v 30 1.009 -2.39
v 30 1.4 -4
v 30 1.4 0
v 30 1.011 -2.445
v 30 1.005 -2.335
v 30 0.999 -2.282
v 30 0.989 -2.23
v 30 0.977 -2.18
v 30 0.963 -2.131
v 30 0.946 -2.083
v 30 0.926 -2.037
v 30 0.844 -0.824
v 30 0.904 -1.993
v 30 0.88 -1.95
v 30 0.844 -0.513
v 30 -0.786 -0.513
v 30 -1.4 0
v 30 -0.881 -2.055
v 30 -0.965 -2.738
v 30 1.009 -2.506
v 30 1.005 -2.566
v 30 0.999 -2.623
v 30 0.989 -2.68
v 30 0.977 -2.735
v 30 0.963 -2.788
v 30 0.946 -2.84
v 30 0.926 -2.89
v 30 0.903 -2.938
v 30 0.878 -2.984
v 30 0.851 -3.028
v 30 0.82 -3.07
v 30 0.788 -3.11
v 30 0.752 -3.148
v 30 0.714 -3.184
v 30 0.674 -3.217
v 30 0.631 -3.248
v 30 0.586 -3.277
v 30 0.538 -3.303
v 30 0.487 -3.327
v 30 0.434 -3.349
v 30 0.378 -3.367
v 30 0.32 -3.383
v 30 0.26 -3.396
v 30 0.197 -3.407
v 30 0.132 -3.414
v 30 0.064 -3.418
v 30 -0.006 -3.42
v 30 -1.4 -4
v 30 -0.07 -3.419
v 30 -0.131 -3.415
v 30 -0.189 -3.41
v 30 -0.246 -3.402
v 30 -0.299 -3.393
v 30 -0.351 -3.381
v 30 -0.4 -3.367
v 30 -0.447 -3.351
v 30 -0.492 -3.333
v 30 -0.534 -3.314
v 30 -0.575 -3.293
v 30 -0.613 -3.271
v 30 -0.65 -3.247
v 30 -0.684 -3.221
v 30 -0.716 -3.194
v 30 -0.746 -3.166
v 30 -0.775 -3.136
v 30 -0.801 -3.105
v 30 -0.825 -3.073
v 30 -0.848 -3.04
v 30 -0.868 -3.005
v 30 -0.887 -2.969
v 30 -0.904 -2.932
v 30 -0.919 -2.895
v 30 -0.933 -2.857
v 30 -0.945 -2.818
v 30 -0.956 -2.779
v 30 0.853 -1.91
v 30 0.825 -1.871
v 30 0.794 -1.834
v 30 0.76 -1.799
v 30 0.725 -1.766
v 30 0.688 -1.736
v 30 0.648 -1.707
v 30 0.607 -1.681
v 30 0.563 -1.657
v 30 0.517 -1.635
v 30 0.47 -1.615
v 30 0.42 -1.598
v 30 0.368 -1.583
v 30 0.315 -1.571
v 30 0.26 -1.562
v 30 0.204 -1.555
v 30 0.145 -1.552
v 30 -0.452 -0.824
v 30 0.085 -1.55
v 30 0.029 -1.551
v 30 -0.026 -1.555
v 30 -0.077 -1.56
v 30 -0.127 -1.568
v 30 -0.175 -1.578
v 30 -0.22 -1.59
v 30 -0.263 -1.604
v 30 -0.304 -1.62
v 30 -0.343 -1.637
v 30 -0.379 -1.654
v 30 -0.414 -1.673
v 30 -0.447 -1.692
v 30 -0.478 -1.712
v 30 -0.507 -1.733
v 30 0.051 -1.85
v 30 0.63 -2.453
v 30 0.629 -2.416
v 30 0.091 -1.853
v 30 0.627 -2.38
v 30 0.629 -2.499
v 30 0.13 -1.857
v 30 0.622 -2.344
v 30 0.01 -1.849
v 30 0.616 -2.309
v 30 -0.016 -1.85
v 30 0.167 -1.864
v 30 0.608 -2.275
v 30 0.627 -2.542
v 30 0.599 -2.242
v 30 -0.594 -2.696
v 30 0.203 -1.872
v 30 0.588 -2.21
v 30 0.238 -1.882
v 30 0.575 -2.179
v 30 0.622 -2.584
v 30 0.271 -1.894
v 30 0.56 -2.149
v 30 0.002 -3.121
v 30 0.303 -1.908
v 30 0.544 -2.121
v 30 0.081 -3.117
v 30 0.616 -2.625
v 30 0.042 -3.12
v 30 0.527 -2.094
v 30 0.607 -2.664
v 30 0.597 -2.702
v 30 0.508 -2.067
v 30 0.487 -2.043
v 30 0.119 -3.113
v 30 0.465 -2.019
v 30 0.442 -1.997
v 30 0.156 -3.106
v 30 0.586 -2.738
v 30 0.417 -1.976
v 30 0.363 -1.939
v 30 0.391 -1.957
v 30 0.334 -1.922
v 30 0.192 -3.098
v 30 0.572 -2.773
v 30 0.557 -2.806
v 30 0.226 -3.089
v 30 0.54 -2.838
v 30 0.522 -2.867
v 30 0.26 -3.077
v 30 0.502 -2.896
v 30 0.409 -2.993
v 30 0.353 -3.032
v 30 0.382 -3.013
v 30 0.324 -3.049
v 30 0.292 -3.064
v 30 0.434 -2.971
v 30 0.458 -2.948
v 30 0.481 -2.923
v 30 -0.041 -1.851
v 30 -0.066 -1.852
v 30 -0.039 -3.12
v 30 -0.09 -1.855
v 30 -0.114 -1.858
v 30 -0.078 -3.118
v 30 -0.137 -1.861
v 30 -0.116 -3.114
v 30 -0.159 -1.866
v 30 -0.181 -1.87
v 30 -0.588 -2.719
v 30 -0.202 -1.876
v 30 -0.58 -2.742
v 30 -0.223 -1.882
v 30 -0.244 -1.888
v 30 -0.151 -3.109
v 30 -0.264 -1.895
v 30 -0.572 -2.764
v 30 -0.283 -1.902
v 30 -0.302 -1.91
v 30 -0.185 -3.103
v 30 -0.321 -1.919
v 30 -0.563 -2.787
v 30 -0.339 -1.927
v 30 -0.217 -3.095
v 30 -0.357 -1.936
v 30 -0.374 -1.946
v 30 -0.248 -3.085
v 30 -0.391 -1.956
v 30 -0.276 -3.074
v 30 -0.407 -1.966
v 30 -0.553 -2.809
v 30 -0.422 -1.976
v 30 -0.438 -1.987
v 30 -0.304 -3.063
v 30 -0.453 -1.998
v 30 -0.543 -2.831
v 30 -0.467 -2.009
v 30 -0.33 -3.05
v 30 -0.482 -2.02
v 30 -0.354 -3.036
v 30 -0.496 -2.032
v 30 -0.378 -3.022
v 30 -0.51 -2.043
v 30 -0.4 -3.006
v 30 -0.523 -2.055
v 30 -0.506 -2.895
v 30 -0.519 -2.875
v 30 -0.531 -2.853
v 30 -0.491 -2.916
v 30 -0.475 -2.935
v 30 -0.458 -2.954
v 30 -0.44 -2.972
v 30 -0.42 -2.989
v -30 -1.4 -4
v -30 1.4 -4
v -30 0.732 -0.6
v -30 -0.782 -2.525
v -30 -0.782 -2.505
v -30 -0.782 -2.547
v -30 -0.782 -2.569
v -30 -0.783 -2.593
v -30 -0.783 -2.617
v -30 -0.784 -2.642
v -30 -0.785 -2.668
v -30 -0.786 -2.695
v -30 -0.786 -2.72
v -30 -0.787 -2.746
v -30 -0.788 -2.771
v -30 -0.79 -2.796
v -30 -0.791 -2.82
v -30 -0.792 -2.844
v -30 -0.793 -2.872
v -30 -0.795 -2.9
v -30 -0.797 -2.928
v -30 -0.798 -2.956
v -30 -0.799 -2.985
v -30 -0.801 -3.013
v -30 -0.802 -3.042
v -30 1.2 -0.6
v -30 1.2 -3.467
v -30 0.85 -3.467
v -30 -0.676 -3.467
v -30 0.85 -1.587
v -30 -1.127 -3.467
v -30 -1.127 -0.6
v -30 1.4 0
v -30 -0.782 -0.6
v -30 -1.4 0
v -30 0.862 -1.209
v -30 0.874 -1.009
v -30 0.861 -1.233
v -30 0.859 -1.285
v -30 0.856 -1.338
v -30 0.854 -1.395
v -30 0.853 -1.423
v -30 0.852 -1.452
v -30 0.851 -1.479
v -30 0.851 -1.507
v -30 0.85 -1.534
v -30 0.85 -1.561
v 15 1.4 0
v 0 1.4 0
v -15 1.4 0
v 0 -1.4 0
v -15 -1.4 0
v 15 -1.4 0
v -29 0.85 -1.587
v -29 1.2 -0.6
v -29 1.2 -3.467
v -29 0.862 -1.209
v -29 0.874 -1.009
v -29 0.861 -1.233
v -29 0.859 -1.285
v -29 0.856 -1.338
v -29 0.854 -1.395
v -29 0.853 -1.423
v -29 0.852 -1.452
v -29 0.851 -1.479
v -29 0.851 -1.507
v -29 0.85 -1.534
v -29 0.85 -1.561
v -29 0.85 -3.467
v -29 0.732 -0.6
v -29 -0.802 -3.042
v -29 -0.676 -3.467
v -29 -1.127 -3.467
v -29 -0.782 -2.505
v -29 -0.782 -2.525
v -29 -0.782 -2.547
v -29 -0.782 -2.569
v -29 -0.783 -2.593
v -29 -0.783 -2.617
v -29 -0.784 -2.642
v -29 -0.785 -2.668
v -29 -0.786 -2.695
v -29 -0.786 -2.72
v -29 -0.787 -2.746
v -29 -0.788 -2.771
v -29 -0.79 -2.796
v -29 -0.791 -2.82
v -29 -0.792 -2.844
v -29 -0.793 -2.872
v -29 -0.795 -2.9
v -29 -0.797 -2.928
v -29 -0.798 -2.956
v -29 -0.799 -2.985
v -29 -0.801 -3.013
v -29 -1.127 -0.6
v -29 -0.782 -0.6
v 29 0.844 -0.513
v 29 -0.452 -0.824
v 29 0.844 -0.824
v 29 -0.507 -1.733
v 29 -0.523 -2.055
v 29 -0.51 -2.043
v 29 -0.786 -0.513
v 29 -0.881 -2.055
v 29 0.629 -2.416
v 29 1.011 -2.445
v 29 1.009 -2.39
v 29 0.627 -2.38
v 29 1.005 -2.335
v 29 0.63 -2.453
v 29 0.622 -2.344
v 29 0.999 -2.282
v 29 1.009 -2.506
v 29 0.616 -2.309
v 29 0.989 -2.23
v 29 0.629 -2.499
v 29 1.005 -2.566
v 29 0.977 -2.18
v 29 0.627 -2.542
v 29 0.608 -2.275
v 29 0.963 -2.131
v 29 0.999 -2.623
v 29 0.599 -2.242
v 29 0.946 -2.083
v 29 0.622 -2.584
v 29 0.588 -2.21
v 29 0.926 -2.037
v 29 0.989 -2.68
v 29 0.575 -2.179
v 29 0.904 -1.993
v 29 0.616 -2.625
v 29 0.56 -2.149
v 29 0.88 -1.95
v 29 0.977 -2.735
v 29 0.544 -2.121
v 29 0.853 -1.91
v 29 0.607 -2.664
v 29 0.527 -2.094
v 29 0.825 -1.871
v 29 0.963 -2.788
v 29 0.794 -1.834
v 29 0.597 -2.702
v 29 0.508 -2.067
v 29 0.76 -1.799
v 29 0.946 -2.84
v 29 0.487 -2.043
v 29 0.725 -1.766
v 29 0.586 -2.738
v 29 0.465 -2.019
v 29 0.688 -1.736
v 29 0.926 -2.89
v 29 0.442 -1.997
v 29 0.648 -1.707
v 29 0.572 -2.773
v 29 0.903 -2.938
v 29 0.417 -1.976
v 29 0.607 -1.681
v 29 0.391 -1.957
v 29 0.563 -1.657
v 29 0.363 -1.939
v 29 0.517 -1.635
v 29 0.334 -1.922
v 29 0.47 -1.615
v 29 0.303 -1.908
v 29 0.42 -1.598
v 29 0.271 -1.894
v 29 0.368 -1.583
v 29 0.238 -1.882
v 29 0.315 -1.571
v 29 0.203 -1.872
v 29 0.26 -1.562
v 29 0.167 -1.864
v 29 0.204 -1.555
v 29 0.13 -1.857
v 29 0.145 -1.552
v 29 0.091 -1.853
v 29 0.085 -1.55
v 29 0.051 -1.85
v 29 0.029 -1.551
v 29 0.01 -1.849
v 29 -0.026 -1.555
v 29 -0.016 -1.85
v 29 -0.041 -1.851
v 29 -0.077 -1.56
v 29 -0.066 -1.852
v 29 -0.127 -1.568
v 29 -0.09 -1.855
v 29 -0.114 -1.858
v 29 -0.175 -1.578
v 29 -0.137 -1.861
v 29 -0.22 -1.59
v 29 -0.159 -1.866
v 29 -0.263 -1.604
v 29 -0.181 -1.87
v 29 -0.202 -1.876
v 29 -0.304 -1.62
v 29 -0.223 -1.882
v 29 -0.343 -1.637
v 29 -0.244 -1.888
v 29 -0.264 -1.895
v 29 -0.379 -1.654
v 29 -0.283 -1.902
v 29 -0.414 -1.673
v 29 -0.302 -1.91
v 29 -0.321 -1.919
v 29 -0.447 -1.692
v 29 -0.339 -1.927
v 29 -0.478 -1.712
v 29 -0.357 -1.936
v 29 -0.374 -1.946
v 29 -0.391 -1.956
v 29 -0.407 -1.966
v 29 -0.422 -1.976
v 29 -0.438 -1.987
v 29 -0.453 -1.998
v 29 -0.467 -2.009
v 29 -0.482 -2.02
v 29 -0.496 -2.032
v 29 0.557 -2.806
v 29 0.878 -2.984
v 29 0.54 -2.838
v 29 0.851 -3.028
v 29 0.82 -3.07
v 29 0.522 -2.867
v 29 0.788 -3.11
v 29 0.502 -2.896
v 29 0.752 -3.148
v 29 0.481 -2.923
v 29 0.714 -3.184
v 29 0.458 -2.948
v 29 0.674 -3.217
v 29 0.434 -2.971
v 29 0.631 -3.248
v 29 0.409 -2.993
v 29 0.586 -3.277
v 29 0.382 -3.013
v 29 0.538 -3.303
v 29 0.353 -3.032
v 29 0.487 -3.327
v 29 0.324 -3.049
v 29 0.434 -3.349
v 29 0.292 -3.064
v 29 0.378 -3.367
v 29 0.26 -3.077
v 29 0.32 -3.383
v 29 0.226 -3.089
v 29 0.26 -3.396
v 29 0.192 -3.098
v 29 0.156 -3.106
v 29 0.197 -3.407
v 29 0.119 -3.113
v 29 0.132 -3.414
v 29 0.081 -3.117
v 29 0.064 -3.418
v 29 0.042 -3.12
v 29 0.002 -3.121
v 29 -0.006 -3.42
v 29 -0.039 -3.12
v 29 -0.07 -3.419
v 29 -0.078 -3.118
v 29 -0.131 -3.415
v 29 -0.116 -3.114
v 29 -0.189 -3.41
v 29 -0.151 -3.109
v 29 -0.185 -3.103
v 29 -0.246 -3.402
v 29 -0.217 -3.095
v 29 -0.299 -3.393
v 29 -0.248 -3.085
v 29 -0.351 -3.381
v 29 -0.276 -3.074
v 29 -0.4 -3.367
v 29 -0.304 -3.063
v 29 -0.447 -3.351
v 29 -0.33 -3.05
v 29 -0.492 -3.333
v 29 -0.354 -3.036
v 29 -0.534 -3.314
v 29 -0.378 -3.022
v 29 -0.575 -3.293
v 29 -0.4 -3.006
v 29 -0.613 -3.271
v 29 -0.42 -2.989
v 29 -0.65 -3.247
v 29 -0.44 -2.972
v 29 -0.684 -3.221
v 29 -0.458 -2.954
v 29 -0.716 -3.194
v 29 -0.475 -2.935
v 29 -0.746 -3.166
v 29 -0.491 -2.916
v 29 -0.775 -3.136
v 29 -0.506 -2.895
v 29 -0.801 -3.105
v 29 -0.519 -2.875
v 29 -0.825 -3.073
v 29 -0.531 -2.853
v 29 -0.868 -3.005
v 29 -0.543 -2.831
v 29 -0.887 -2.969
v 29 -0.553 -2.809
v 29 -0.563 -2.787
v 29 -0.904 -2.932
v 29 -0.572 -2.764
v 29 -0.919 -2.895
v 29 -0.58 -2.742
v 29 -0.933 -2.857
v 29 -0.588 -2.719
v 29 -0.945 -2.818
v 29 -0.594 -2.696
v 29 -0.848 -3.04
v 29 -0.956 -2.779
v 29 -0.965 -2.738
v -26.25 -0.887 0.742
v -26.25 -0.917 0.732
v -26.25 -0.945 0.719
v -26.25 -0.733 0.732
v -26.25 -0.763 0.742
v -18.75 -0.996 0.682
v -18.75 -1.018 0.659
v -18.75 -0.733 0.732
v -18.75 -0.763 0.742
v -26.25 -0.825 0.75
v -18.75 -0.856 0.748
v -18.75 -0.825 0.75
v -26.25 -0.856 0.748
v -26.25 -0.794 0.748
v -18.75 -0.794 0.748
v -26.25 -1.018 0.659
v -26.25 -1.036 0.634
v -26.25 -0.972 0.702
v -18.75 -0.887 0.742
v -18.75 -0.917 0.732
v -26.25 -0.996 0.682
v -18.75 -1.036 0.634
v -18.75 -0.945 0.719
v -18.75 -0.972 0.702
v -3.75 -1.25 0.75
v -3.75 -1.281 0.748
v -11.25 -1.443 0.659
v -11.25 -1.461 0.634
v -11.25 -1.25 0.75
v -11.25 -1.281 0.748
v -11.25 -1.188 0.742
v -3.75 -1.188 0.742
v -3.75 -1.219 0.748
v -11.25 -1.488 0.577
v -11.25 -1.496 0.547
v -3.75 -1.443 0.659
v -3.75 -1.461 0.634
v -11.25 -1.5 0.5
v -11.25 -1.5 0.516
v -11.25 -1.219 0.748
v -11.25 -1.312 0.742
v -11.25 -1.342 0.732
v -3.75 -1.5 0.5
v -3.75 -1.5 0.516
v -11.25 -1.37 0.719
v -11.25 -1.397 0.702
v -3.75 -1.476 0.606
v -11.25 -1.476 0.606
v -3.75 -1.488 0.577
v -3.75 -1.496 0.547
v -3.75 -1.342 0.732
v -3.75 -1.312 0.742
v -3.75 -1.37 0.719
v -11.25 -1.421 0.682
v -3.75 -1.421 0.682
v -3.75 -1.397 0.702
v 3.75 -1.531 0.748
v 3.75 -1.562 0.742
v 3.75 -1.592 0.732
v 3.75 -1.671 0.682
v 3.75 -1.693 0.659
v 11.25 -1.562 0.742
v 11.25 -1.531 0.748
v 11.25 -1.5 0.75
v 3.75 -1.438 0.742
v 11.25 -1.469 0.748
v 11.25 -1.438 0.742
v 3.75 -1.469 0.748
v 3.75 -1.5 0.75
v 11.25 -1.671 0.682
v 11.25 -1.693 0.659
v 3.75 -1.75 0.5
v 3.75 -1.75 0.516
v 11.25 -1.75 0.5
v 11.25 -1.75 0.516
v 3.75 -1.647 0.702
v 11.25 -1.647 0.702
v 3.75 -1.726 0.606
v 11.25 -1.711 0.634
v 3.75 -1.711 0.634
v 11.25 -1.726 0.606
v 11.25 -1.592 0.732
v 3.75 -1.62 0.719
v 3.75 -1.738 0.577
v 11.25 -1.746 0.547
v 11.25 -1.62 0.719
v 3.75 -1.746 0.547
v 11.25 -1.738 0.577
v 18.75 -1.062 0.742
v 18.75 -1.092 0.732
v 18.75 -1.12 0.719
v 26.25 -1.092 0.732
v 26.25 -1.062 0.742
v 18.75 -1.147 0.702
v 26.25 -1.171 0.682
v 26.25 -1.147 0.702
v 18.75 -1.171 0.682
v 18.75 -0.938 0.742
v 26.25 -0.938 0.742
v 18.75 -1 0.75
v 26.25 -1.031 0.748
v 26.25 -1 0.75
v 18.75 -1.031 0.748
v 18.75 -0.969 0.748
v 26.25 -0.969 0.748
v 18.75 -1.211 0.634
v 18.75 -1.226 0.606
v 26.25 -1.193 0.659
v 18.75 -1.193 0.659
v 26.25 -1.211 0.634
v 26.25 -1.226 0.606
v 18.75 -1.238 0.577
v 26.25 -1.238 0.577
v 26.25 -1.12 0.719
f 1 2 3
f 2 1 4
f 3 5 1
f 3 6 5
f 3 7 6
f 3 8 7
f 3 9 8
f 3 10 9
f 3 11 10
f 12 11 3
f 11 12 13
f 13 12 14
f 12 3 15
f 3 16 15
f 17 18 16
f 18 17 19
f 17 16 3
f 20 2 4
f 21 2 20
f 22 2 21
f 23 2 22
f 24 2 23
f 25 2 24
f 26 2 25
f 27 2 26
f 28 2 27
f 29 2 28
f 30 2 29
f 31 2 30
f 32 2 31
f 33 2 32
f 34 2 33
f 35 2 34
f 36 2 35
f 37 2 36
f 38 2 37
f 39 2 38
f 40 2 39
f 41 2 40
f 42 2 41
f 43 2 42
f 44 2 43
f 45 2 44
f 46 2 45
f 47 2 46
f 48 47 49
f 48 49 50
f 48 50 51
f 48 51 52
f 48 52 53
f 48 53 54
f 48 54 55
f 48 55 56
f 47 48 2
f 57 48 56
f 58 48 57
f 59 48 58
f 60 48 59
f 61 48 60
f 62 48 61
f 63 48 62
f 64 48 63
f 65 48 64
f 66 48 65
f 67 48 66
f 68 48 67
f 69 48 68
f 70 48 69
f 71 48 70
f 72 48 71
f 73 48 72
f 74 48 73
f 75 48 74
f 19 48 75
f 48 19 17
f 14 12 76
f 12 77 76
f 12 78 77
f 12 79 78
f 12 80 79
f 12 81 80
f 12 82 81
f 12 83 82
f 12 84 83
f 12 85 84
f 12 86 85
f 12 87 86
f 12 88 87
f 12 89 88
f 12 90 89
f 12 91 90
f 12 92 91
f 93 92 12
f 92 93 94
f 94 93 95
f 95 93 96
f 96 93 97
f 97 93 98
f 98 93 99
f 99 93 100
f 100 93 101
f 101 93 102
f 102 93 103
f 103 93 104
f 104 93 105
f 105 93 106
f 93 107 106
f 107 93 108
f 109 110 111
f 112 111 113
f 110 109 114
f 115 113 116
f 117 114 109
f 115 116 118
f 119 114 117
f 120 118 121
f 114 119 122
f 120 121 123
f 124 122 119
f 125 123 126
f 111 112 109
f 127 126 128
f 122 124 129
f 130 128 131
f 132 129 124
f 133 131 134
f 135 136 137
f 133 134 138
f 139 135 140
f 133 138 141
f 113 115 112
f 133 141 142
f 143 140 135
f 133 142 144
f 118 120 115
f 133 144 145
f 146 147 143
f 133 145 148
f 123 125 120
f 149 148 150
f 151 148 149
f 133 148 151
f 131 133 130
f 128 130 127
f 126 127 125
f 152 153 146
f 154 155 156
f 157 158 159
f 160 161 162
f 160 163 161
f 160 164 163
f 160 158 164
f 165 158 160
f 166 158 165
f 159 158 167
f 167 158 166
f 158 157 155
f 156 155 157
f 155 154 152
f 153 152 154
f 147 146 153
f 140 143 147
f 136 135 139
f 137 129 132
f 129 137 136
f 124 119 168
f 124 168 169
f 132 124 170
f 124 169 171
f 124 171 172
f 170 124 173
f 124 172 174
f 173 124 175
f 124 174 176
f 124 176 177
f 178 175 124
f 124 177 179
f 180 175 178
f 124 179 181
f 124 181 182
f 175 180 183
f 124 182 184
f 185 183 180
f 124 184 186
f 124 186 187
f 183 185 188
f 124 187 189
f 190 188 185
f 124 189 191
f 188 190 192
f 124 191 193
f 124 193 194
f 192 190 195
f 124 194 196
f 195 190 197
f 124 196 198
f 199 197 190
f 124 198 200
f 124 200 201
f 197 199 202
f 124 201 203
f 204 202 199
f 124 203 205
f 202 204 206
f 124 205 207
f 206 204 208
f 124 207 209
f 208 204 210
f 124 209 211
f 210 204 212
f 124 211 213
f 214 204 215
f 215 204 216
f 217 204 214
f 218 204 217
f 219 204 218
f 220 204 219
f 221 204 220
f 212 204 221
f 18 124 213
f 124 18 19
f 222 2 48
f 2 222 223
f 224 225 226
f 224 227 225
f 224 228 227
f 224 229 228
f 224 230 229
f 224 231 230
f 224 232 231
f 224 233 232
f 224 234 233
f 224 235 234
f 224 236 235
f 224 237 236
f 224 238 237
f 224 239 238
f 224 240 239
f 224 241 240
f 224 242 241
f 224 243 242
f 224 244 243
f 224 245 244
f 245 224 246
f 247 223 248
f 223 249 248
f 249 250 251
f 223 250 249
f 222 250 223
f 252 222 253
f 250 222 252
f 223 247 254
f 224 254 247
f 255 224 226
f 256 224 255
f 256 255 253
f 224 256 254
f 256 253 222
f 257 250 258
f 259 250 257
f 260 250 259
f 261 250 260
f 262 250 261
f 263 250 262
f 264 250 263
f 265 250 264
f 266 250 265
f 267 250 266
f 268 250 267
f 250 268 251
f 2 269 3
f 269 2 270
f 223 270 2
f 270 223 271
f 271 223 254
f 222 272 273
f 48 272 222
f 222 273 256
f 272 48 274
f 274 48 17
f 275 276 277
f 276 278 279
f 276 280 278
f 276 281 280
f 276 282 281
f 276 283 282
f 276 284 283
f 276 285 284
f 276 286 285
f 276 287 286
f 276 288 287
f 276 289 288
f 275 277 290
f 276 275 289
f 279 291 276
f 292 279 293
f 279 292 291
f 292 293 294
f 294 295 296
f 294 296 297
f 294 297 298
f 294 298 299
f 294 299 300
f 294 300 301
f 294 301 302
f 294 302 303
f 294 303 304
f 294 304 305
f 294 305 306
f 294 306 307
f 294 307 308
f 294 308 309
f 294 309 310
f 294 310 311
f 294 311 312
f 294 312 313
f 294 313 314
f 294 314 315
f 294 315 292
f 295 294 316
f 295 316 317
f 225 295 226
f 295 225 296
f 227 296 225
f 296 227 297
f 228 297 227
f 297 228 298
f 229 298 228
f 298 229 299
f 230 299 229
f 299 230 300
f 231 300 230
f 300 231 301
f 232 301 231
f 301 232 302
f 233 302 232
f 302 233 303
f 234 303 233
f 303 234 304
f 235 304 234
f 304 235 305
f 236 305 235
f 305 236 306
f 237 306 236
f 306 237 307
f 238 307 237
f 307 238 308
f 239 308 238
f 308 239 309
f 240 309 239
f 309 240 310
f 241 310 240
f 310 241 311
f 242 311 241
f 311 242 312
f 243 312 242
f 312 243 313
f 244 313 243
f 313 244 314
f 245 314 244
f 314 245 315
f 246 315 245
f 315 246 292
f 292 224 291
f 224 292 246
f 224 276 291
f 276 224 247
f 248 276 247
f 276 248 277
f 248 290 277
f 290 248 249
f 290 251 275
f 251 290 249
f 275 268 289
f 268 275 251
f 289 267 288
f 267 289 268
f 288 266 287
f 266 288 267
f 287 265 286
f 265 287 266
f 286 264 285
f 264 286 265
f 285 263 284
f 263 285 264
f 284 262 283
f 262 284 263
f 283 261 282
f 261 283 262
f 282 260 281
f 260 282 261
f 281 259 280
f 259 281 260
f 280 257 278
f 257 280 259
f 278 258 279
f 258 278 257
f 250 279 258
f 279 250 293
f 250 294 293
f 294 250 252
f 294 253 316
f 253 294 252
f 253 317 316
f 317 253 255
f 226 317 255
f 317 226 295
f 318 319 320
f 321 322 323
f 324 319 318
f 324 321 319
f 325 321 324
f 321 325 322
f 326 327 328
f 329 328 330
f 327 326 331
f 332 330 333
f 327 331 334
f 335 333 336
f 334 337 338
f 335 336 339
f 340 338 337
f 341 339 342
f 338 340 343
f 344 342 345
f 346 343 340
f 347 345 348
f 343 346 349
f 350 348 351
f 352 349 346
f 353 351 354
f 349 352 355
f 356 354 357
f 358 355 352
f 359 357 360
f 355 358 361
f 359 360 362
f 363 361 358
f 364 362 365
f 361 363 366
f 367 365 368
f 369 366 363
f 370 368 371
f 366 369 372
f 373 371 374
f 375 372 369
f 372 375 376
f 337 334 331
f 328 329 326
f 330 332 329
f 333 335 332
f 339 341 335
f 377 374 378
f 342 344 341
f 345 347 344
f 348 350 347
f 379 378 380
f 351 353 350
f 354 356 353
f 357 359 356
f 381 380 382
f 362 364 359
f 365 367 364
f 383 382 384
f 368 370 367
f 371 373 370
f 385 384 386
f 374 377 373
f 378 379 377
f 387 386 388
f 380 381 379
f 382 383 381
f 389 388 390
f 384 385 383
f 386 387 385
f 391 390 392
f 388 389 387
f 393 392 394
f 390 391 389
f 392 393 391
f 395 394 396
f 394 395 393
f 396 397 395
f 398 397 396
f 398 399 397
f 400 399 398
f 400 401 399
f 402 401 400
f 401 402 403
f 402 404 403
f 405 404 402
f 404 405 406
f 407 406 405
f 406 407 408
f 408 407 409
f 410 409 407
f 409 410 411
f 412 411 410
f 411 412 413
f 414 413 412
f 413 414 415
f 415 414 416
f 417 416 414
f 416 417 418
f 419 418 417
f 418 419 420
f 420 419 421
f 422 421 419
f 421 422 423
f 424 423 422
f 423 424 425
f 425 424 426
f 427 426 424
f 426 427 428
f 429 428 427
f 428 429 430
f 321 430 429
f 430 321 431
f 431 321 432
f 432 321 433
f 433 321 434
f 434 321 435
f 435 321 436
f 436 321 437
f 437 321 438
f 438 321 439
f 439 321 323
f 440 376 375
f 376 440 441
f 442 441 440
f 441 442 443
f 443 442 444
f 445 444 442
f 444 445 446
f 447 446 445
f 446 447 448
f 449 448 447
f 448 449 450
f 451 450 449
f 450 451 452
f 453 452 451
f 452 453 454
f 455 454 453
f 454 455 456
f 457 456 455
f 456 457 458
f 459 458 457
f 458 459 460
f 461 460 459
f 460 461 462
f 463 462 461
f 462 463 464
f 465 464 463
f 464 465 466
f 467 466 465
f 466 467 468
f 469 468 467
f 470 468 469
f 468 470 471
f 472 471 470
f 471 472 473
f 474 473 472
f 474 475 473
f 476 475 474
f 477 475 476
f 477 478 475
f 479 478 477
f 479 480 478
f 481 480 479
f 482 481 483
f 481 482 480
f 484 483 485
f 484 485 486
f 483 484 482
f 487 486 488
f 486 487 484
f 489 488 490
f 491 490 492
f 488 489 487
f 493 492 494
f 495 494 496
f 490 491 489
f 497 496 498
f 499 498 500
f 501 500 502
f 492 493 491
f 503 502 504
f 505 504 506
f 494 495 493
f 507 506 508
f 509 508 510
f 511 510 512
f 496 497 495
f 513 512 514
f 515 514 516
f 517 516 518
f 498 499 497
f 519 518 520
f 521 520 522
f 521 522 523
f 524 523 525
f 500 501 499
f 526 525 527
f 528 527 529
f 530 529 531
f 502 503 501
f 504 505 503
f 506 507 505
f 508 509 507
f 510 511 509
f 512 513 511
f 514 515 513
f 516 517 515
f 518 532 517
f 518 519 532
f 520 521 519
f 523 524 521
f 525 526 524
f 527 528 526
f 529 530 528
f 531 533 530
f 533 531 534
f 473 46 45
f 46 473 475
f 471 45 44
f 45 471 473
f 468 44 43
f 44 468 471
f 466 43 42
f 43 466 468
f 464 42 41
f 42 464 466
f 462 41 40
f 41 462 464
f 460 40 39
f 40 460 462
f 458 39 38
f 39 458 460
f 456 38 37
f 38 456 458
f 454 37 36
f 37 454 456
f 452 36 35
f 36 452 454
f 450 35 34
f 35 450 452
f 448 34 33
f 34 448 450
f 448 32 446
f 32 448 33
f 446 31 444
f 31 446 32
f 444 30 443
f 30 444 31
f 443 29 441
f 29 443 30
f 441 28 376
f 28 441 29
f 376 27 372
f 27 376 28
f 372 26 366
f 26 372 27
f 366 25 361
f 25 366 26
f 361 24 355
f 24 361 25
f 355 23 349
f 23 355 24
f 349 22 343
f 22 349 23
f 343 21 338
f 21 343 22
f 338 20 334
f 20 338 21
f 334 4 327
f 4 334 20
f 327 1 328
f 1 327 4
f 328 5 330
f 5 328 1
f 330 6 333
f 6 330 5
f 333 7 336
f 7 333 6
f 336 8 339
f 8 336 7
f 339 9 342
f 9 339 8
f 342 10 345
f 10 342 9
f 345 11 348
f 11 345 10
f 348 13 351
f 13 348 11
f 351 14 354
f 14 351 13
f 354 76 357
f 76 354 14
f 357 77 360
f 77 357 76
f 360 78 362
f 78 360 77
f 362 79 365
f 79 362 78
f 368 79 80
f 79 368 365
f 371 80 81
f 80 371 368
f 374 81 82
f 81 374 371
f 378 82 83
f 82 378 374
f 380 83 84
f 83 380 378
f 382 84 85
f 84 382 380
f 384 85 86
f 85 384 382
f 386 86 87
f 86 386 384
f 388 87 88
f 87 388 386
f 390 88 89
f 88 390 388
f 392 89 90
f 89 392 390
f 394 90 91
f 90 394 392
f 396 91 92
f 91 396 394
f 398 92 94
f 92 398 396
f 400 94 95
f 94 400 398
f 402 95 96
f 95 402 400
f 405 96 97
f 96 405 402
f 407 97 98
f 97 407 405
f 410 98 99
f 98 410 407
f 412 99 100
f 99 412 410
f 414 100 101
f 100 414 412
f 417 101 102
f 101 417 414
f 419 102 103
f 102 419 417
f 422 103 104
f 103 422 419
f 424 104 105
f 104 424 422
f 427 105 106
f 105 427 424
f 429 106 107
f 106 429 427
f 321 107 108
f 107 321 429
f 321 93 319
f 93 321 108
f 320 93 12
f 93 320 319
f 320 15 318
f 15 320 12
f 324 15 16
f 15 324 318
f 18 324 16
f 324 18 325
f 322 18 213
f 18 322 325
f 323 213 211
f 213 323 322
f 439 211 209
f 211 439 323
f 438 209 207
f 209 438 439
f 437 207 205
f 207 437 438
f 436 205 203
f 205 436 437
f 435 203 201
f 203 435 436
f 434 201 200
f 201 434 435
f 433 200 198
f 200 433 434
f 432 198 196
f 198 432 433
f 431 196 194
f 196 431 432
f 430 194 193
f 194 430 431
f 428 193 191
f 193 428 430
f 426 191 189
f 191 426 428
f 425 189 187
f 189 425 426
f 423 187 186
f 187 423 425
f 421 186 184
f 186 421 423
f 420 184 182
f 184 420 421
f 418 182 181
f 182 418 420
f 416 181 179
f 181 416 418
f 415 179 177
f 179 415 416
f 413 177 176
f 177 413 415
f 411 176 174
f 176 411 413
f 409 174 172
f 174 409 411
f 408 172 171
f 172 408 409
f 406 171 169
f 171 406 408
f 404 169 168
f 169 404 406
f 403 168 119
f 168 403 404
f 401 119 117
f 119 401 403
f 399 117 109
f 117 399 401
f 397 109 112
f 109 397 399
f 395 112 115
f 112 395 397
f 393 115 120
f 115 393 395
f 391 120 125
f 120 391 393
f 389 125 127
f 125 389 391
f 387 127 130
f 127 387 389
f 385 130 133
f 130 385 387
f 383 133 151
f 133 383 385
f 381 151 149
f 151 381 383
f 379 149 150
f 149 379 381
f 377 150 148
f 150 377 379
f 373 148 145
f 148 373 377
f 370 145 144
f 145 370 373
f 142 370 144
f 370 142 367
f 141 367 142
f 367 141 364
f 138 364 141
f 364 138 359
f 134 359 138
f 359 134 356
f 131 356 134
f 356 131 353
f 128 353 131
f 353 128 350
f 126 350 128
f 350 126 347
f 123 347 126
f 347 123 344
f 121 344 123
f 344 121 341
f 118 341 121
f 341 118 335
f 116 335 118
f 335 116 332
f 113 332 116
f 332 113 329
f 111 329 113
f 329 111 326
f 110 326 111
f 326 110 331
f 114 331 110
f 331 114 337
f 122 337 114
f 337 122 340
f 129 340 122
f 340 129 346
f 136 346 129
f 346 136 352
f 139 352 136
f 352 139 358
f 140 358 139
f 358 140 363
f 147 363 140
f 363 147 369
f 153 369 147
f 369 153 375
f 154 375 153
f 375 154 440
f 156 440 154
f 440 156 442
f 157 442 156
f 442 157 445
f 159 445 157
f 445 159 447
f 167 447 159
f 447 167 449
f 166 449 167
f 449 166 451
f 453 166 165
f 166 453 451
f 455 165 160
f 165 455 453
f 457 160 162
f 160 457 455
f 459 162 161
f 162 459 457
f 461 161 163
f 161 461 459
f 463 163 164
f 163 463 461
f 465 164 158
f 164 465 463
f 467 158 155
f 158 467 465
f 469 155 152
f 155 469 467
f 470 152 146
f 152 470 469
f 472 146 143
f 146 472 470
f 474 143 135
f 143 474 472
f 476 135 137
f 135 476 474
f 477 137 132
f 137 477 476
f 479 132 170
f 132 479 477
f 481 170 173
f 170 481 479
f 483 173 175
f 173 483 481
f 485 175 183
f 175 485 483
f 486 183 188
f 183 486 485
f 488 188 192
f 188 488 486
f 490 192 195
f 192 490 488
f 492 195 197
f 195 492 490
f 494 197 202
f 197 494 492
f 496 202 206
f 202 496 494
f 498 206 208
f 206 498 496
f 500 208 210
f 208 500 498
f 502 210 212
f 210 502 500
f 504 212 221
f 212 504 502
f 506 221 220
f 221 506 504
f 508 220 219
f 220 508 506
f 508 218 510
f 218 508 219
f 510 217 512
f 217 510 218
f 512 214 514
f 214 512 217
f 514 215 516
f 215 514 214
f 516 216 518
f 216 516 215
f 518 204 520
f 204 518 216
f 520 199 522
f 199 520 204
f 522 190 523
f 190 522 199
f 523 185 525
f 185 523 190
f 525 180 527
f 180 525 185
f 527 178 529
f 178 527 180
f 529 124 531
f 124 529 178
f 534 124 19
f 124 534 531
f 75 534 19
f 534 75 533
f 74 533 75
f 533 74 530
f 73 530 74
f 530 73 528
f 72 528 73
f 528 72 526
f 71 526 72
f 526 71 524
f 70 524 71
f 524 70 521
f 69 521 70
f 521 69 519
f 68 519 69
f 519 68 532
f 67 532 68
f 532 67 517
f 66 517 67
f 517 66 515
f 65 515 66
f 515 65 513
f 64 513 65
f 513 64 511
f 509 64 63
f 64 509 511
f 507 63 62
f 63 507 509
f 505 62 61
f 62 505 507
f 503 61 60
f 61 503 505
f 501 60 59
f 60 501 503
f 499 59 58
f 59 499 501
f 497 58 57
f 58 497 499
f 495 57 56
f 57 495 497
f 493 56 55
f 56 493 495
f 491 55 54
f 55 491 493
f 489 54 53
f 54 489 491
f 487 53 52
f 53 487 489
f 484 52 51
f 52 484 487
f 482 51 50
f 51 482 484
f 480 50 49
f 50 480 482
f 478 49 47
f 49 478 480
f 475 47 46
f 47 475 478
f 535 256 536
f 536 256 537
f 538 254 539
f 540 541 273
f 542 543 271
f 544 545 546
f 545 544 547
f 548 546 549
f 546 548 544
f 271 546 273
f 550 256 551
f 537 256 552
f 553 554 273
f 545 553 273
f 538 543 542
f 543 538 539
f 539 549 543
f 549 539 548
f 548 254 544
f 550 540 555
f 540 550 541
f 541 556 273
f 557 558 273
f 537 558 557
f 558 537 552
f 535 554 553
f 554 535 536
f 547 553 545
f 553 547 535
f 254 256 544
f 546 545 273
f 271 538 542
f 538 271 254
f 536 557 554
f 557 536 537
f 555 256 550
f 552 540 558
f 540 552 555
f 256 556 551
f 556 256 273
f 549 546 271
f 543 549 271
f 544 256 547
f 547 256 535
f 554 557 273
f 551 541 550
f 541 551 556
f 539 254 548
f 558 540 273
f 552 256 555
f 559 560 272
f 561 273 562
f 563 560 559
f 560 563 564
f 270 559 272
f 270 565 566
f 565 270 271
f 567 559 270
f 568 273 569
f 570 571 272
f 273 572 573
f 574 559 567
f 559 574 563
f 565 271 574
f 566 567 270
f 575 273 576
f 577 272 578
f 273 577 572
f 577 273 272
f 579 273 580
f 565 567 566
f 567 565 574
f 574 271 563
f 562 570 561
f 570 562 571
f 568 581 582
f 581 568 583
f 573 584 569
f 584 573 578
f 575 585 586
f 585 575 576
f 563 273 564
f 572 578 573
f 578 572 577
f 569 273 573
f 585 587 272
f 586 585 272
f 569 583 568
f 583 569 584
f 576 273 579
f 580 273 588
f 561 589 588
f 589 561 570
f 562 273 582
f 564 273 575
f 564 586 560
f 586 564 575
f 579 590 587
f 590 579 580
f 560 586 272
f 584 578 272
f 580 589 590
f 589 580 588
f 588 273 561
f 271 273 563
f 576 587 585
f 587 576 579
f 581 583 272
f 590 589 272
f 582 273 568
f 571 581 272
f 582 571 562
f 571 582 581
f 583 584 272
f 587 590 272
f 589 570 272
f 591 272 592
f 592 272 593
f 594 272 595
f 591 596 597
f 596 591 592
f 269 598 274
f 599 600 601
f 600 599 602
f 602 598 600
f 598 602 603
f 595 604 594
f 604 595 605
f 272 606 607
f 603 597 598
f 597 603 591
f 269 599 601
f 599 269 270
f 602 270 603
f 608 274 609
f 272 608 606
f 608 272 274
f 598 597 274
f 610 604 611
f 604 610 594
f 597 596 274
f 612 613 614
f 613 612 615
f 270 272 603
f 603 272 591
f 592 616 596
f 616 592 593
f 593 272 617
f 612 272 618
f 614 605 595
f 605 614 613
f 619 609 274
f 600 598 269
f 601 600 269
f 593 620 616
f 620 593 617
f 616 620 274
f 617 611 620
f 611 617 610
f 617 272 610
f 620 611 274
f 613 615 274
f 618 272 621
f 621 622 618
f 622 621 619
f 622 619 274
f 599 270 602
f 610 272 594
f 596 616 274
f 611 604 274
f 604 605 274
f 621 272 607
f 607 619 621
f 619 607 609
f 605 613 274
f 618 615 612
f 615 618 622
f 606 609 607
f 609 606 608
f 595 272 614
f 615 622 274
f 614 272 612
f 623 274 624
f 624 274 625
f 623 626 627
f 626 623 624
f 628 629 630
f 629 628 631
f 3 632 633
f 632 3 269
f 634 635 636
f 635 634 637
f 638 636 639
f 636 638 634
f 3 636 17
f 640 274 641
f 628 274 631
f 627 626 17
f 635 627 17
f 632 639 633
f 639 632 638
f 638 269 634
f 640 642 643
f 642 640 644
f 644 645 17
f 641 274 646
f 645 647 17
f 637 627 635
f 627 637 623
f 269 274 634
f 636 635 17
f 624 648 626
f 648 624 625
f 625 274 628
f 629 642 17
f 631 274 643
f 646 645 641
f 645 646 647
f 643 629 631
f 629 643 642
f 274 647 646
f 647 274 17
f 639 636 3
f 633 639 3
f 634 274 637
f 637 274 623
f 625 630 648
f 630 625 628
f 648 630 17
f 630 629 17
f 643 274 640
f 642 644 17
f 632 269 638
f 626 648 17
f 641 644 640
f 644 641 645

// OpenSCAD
$fn=50;

version = "5";

sl = 60;  // saddle slot length
st = 2.8;   // saddle slot thick
ss = 4;   // saddle slot depth

sd = 0.5;       // saddle diameter
sx = 15;  // string spacing


// from https://www.liutaiomottola.com/formulae/compensation.htm
// actual compensation numbers are
// g = 1.43
// C = 2.87
// E = 1.86
// A = 1.22
// but there's some compensation in the bridge position already so this is a bit of a crapshoot

sn = 4;               // number of strings
shs = [ .75, .75, .75, .75];  // heights
sgs = [ 0, 0, 0, 0 ]; // groove diameter
scs = [ 0.825, 1.25, 1.5, 1 ]; // compensation for each string

difference() {
  translate([0,0,-ss/2]) cube([sl, st, ss], center=true);
  translate([-sl/2+1,0,-ss/2]) rotate([-90,0,90]) linear_extrude(2) text("N", halign="center", valign="center", size=3);  
  translate([sl/2-1,0,-ss/2]) rotate([90,0,90]) linear_extrude(2) text(version, halign="center", valign="center", size=3);
}

for (n = [0:sn-1]) {
  translate([(n - sn/2 + 0.5) * sx, 0, 0])
    difference() {
      hull() {
        translate([0,-scs[n],shs[n]-sd/2]) intersection() {
          rotate([0,90,0]) cylinder(sx/2, d=sd, center=true);
          translate([0,0,sd/2]) cube([sx/2, sd, sd], center=true);
        }
        translate([0,0,0.00005]) cube([sx, st, 0.0001], center=true);
      }
      #translate([0,0,shs[n]]) rotate([90,0,0]) cylinder(100, d=sgs[n], center=true);
  
    }
} 
        
